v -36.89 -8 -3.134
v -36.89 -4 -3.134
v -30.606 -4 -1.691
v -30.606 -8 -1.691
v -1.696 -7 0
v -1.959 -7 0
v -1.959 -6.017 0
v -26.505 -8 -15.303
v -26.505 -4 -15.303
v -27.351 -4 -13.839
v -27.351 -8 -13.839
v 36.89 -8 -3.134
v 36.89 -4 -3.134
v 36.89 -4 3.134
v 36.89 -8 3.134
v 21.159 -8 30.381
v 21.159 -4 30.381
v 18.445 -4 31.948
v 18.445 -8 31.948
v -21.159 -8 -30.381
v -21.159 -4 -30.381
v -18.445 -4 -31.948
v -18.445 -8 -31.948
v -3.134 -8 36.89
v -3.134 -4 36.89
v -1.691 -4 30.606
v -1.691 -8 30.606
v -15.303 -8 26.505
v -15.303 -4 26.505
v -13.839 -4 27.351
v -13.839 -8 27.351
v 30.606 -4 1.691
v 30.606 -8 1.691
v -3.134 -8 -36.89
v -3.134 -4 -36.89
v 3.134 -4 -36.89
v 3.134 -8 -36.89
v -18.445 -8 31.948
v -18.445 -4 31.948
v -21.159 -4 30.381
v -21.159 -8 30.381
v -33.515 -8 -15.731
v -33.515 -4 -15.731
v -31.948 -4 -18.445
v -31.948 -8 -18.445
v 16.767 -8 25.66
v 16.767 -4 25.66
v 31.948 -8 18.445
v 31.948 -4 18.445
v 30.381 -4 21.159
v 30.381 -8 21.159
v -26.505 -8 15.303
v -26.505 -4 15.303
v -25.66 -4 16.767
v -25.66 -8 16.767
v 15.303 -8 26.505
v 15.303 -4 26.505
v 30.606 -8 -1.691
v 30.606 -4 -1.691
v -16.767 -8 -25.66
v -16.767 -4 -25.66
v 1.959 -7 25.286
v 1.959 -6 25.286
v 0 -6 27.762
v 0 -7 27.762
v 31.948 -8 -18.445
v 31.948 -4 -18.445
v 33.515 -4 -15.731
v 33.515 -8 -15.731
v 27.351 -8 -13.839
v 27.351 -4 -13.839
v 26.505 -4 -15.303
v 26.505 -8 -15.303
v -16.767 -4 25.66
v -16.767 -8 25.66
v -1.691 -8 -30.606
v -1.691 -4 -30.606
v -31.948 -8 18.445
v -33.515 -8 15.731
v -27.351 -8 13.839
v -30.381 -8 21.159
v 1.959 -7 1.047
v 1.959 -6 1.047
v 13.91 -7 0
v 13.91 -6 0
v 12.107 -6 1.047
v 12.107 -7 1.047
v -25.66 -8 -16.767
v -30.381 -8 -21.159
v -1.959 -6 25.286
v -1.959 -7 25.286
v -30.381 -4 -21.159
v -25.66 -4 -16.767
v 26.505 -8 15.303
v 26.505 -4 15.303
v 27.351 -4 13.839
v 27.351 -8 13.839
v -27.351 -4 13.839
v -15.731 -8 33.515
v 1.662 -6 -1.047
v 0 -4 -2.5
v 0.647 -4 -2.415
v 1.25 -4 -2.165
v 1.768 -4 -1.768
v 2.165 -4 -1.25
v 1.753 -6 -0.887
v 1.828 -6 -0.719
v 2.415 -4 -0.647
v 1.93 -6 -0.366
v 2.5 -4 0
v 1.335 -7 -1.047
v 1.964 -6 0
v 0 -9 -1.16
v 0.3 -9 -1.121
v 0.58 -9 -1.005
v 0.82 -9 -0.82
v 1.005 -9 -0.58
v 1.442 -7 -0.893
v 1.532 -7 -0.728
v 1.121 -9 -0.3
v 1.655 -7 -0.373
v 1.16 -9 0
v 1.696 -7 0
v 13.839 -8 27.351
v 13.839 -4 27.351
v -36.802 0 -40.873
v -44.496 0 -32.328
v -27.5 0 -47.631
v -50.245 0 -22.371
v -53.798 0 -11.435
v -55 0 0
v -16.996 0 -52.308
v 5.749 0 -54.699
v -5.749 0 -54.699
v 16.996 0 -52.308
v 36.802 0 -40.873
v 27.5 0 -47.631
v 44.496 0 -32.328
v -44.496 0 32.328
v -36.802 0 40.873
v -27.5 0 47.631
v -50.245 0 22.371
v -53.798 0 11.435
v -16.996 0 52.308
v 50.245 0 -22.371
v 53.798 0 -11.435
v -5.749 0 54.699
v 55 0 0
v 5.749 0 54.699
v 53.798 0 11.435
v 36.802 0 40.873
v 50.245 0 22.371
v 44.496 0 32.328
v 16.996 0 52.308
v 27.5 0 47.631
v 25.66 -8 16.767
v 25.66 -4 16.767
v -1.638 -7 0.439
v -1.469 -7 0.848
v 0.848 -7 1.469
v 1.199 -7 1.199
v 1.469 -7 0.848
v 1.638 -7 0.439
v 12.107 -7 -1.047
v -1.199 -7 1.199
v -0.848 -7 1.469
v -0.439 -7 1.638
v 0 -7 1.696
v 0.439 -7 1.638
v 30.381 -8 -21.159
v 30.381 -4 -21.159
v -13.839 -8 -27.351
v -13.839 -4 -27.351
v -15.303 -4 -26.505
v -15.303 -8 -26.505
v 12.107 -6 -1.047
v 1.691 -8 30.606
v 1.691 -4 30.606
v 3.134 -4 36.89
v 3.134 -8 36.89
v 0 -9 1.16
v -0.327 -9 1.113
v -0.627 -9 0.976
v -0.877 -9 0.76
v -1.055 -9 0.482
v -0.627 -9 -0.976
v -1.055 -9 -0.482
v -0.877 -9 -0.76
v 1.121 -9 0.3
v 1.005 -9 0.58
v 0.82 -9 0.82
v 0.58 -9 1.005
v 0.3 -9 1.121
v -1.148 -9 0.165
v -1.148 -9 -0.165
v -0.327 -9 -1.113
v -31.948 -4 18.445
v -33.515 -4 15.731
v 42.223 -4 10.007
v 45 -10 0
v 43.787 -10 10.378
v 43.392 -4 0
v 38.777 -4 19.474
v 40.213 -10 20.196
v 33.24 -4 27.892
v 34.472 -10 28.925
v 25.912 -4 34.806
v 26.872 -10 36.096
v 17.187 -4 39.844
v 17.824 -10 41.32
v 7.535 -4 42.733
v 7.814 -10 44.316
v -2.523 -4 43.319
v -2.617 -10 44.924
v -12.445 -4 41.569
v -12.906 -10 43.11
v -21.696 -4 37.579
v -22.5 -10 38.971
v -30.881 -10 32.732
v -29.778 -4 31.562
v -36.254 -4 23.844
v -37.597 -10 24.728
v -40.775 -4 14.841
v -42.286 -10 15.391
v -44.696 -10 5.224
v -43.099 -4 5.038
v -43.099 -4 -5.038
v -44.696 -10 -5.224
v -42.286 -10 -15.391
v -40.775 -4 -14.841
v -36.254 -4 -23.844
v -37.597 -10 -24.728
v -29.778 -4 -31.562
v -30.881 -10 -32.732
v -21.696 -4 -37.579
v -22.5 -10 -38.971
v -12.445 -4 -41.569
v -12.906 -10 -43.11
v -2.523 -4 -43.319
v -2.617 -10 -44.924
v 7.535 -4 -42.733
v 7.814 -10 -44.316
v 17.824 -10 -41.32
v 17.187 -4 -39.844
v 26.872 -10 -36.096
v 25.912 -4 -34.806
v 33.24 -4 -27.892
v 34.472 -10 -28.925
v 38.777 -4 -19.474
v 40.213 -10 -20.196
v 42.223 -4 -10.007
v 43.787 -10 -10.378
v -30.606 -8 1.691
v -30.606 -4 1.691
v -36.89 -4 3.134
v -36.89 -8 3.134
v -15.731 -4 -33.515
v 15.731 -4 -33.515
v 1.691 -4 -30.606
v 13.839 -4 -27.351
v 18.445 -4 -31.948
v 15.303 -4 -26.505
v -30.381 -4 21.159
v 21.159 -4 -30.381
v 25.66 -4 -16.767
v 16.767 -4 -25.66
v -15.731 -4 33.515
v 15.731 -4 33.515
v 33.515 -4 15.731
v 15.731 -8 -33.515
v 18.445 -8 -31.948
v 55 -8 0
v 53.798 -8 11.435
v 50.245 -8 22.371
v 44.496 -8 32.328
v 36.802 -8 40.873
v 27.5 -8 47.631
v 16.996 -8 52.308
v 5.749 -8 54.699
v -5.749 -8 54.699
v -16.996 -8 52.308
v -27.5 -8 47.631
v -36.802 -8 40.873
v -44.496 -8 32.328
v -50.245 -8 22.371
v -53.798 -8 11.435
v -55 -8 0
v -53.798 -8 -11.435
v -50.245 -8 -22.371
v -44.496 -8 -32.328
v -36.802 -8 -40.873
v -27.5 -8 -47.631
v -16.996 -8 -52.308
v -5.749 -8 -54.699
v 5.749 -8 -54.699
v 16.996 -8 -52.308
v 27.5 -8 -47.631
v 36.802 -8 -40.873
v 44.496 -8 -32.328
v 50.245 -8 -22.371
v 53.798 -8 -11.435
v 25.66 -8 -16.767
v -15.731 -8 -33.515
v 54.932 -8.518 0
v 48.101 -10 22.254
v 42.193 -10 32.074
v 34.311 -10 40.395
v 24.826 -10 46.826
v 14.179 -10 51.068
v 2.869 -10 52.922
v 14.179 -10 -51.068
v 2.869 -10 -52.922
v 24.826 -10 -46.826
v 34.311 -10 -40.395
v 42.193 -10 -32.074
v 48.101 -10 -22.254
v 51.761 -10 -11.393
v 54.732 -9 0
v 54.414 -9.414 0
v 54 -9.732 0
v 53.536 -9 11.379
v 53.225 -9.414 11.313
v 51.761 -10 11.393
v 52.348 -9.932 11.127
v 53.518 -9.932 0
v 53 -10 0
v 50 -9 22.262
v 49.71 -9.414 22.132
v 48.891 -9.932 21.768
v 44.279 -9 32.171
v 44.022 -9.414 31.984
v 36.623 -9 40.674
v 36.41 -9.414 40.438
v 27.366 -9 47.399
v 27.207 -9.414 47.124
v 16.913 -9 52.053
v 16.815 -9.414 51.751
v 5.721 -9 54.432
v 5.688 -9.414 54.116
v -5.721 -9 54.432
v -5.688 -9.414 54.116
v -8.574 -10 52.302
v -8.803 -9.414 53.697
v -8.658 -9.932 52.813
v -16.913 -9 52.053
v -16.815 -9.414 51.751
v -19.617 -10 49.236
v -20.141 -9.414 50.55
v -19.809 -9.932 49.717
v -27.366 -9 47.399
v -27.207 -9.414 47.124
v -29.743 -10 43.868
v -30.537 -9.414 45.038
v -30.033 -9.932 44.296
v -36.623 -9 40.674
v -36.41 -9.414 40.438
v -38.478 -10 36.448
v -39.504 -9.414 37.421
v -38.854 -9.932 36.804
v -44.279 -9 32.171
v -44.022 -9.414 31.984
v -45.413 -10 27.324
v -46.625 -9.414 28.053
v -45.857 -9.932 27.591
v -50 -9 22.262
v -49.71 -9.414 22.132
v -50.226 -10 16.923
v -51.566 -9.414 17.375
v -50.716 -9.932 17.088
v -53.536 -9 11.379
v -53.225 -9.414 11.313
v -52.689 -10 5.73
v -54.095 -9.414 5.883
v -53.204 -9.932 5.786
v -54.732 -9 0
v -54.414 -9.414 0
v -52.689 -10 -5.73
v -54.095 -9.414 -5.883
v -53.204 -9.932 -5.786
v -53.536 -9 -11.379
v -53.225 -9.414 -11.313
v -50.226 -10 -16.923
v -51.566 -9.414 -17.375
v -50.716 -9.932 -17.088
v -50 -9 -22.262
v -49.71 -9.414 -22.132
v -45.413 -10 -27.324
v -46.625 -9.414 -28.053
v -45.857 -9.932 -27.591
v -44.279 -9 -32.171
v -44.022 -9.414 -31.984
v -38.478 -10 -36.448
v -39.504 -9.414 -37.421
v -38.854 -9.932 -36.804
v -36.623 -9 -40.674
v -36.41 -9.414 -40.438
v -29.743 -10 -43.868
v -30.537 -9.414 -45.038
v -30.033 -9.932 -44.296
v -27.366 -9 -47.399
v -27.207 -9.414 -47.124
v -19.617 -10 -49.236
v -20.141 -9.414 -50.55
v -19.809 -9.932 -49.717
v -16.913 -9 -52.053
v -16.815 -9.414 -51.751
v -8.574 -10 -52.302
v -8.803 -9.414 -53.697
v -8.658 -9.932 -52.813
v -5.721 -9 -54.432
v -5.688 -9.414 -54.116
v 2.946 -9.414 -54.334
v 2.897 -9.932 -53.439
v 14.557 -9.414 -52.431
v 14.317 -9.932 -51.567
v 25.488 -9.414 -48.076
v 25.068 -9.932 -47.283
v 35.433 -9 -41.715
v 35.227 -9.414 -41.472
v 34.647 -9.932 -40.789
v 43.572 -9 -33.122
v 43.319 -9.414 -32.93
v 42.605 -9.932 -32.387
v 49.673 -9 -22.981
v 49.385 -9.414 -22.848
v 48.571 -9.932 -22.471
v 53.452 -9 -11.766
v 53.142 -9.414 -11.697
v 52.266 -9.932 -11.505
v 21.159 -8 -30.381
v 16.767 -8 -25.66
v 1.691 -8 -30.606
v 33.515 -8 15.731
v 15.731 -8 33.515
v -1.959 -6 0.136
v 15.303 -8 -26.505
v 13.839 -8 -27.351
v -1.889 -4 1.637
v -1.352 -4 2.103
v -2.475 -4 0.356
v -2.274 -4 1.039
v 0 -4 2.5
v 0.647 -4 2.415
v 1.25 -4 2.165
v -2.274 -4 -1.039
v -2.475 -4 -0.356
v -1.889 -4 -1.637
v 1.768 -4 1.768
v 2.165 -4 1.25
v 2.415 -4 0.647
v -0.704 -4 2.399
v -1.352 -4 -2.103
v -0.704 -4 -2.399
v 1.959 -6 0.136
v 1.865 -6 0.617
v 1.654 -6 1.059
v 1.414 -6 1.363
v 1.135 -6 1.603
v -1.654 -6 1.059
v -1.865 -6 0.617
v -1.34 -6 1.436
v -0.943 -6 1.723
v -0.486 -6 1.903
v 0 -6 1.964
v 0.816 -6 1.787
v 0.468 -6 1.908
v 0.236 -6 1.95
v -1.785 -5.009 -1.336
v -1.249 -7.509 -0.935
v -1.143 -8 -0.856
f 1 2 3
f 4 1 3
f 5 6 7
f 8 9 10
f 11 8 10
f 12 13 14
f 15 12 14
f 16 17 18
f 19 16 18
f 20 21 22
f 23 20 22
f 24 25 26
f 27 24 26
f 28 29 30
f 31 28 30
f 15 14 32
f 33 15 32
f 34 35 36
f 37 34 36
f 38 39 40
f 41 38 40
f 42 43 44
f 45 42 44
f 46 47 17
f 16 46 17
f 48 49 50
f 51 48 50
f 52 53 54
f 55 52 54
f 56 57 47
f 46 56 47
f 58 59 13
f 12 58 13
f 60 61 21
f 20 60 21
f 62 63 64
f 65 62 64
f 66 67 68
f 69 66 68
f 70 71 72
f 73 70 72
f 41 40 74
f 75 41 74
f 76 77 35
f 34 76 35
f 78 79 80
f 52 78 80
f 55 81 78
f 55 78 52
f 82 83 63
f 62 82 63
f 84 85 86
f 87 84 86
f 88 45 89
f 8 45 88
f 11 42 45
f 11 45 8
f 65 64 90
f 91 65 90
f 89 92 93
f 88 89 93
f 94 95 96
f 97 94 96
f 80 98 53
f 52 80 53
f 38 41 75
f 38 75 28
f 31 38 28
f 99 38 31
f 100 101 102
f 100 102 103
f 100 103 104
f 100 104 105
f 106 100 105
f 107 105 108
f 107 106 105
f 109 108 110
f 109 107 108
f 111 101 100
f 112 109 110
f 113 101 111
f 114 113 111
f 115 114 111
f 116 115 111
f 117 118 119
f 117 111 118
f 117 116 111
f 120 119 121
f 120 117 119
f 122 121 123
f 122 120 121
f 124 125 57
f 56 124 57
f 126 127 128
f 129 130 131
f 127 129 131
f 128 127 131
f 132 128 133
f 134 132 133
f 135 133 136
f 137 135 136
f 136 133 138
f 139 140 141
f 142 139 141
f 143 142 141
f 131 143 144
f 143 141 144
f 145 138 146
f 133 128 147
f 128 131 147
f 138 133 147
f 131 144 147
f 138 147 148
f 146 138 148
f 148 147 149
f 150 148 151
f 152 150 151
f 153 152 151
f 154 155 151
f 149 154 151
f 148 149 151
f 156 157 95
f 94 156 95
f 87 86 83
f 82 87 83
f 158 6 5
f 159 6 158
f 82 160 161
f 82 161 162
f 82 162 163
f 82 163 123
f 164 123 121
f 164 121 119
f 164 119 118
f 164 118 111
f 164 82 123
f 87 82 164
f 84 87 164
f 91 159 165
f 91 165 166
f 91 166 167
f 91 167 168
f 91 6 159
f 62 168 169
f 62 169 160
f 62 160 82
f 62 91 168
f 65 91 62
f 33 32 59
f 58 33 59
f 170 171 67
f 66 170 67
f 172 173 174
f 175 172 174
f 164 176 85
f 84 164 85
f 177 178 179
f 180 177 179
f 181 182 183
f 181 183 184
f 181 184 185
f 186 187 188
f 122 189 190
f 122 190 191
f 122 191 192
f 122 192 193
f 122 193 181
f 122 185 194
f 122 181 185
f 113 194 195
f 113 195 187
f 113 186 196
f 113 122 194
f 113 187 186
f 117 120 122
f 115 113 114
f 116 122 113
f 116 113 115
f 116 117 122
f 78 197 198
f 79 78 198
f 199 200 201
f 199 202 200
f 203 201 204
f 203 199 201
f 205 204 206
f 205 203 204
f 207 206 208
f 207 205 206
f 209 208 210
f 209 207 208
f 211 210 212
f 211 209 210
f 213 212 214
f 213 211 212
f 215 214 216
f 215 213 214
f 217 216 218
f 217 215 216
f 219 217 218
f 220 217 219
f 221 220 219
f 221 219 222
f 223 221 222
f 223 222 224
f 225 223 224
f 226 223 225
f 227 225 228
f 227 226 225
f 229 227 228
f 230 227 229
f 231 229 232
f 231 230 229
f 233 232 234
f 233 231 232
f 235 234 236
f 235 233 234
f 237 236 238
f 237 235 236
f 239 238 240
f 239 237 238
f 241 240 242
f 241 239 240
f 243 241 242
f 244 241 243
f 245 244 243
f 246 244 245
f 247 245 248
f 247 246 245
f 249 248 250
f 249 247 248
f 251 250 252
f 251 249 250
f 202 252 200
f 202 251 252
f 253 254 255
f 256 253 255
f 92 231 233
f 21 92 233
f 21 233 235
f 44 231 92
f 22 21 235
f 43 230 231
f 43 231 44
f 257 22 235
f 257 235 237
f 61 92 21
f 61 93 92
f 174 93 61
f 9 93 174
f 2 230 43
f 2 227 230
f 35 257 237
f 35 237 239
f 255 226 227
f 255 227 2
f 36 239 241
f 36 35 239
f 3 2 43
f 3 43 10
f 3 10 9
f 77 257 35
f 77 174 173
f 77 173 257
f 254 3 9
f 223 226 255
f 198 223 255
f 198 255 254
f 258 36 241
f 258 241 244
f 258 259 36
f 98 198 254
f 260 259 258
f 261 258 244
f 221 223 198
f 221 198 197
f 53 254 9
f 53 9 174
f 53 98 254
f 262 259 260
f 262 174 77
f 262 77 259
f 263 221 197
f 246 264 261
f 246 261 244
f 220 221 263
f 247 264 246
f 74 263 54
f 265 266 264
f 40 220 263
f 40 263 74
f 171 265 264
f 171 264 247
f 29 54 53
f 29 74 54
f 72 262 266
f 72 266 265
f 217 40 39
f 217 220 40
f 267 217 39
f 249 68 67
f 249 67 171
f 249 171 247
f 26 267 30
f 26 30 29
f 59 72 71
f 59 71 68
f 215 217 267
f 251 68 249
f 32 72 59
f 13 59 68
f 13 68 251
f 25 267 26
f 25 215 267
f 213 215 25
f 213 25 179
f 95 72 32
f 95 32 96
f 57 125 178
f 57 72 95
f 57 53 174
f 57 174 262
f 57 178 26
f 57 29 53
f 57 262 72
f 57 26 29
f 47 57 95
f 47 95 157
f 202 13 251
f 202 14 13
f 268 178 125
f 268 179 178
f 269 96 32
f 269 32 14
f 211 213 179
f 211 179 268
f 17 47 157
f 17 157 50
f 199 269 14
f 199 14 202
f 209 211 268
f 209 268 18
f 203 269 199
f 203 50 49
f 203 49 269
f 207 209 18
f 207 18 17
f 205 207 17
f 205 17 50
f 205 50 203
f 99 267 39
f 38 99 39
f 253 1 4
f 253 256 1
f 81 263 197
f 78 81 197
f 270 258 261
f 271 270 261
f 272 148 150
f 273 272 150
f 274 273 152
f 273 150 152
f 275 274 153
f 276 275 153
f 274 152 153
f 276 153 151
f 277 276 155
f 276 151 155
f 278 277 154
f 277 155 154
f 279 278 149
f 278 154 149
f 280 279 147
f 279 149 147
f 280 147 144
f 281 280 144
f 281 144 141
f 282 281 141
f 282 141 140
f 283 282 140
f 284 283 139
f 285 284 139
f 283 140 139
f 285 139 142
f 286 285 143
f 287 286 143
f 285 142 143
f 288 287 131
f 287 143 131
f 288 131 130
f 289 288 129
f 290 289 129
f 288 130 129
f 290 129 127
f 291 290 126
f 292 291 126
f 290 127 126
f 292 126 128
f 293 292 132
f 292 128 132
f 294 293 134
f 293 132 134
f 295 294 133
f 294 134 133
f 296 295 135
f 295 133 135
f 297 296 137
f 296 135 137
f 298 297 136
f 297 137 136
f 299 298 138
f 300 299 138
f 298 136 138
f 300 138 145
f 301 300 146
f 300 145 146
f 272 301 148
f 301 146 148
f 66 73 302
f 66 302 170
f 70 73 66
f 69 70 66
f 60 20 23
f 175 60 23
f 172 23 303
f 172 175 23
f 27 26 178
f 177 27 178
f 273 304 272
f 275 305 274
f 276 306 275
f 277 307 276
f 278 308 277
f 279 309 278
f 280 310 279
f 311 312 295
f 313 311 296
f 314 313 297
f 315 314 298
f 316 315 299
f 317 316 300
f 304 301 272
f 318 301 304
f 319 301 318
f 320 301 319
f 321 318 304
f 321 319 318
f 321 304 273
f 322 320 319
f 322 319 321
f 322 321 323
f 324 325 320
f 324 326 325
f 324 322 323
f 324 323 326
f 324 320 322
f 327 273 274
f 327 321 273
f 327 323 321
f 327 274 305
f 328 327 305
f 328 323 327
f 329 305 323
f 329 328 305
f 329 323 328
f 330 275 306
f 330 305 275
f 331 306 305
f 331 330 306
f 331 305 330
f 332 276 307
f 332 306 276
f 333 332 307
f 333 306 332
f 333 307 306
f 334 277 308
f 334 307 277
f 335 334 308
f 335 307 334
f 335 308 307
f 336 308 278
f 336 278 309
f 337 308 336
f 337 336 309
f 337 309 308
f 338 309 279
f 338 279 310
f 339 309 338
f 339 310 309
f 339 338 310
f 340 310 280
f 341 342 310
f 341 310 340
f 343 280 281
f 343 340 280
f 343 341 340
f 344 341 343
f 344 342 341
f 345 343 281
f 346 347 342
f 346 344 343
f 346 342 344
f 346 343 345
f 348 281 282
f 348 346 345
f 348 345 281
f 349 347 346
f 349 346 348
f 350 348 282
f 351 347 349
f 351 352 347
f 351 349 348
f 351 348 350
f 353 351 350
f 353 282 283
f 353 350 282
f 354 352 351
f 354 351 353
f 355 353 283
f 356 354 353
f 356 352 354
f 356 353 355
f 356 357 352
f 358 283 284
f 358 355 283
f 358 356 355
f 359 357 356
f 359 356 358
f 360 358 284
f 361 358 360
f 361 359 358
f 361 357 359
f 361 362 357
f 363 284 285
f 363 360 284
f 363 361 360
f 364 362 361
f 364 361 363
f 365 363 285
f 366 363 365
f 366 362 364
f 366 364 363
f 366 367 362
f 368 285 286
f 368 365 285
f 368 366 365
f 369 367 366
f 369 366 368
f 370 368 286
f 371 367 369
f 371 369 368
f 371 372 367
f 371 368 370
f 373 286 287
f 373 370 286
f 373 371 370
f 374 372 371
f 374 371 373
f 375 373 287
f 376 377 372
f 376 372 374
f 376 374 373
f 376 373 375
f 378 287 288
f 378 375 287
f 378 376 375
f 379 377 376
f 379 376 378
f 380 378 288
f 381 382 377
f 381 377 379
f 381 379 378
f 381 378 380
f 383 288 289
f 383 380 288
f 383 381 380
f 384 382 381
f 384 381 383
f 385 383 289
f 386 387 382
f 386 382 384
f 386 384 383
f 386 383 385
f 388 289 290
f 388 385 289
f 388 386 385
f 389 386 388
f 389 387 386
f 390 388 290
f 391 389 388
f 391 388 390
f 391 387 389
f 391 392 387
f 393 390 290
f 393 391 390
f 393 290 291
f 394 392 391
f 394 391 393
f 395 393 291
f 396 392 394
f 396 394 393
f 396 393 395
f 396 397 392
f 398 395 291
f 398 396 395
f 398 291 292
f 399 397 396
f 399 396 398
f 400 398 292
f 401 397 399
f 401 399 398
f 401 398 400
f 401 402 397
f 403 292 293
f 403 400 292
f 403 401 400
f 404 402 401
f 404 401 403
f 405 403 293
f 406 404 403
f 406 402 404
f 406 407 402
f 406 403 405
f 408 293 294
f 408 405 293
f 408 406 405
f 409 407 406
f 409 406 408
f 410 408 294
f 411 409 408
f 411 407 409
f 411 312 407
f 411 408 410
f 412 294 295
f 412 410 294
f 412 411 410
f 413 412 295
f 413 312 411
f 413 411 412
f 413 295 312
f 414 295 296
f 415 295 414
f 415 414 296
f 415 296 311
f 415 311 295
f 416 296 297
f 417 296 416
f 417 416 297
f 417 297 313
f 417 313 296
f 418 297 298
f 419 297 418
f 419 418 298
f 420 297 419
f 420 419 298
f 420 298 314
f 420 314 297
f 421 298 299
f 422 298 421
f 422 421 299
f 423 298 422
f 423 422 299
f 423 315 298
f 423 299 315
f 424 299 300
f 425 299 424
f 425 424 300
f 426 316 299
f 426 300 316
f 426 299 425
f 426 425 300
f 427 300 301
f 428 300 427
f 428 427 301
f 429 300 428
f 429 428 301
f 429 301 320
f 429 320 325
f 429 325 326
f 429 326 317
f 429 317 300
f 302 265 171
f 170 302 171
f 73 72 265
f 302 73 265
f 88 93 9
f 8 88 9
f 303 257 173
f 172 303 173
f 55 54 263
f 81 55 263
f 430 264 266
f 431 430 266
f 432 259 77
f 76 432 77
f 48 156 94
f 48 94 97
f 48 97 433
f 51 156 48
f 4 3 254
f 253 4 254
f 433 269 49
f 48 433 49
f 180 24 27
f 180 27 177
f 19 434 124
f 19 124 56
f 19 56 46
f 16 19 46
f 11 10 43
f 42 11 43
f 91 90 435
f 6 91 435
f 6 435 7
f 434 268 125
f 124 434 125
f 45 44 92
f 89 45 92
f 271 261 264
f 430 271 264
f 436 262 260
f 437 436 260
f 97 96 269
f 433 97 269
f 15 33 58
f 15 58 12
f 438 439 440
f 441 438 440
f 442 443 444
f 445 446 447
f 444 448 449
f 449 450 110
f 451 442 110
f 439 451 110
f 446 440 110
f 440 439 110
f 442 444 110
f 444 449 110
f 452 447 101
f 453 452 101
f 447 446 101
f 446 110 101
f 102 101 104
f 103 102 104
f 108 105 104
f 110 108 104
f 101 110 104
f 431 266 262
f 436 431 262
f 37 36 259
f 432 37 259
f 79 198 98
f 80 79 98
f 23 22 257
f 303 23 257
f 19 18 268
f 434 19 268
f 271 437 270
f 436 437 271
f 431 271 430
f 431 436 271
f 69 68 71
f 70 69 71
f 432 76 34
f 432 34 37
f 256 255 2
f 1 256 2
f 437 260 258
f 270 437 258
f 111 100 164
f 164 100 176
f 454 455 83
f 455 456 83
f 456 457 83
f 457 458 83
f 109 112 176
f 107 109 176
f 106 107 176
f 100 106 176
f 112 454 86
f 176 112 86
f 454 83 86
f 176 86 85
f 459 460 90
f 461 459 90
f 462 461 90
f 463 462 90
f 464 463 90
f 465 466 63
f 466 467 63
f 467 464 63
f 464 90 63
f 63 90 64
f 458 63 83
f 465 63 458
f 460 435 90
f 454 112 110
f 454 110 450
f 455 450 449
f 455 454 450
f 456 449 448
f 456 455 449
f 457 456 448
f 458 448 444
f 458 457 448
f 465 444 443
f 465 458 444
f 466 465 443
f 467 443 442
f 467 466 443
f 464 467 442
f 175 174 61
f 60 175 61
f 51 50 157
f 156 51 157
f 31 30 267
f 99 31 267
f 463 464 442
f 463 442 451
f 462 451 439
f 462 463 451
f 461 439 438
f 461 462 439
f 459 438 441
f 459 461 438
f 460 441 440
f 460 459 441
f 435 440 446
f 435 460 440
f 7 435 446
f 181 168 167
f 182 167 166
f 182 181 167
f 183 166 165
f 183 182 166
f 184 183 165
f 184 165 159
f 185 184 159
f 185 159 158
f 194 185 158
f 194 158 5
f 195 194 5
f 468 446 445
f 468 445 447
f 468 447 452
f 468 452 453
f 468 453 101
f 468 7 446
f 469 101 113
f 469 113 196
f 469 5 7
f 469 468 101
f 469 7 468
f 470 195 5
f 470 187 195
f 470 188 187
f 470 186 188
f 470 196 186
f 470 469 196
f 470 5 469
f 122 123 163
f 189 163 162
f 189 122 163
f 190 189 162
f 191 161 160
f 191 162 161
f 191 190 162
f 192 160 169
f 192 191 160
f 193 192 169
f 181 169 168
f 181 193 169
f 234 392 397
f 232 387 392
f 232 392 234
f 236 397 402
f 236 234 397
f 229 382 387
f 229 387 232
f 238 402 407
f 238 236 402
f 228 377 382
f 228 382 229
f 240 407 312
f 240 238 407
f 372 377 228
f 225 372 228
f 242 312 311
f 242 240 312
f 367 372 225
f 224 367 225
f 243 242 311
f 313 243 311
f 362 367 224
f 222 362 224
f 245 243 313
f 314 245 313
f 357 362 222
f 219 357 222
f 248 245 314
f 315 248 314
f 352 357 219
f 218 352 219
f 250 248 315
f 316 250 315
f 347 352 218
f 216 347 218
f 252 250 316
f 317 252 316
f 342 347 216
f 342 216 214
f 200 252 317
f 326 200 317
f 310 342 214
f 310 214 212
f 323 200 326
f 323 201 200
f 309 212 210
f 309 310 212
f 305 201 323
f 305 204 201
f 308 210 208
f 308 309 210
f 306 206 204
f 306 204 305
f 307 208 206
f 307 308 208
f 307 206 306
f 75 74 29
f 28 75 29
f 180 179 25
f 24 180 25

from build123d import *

# Parameters (mm, degrees)
F0_R      = 55
F1_DEPTH  = 10
F2_R      = 45
F3_DEPTH  = 6
F3_TAPER  = 15
F5_DEPTH  = 4
F11_DEPTH = 5
F11_TAPER = 15
F14_DEPTH = 1
F16_DEPTH = 1
F17_R     = 2


# Not quite as in the source:
# - the program builds the solid bodies; features that only make, move or delete a surface that nothing else refers to are left out


with BuildPart() as f1:
    # F0 (on Front) → F1 (new body)
    with BuildSketch(Plane.XZ):
        Circle(F0_R)
    extrude(amount=F1_DEPTH)

    # F2 (on face) → F3 (cut)
    with BuildSketch(Plane.XZ.offset(10)):
        Circle(F2_R)
    extrude(amount=-F3_DEPTH, taper=F3_TAPER, mode=Mode.SUBTRACT)

    # F4 (on face) → F5 (join)
    with BuildSketch(Plane.XZ.offset(4)):
        Polygon((0, 36.8904769421), (-3.1339118723, 36.8904769421), (-1.6905769007, 30.6056980044), (0, 30.6056980044), (1.6905769007, 30.6056980044), (3.1339118723, 36.8904769421), align=None)
        Polygon((18.445238471, 31.9480901896), (15.7311911764, 33.5150461257), (13.8387664591, 27.3506004227), (15.3028490022, 26.5053119723), (16.7669315453, 25.660023522), (21.1592857656, 30.3811342534), align=None)
        Polygon((31.9480901896, 18.445238471), (30.3811342534, 21.1592857656), (25.660023522, 16.7669315453), (26.5053119723, 15.3028490022), (27.3506004227, 13.8387664591), (33.5150461257, 15.7311911764), align=None)
        Polygon((36.8904769421, 0), (36.8904769421, 3.1339118723), (30.6056980044, 1.6905769007), (30.6056980044, 0), (30.6056980044, -1.6905769007), (36.8904769421, -3.1339118723), align=None)
        Polygon((31.9480901896, -18.445238471), (33.5150461257, -15.7311911764), (27.3506004227, -13.8387664591), (26.5053119723, -15.3028490022), (25.660023522, -16.7669315453), (30.3811342534, -21.1592857656), align=None)
        Polygon((18.445238471, -31.9480901896), (21.1592857656, -30.3811342534), (16.7669315453, -25.660023522), (15.3028490022, -26.5053119723), (13.8387664591, -27.3506004227), (15.7311911764, -33.5150461257), align=None)
        Polygon((0, -36.8904769421), (3.1339118723, -36.8904769421), (1.6905769007, -30.6056980044), (0, -30.6056980044), (-1.6905769007, -30.6056980044), (-3.1339118723, -36.8904769421), align=None)
        Polygon((-18.445238471, -31.9480901896), (-15.7311911764, -33.5150461257), (-13.8387664591, -27.3506004227), (-15.3028490022, -26.5053119723), (-16.7669315453, -25.660023522), (-21.1592857656, -30.3811342534), align=None)
        Polygon((-31.9480901896, -18.445238471), (-30.3811342534, -21.1592857656), (-25.660023522, -16.7669315453), (-26.5053119723, -15.3028490022), (-27.3506004227, -13.8387664591), (-33.5150461257, -15.7311911764), align=None)
        Polygon((-36.8904769421, 0), (-36.8904769421, -3.1339118723), (-30.6056980044, -1.6905769007), (-30.6056980044, 0), (-30.6056980044, 1.6905769007), (-36.8904769421, 3.1339118723), align=None)
        Polygon((-31.9480901896, 18.445238471), (-33.5150461257, 15.7311911764), (-27.3506004227, 13.8387664591), (-26.5053119723, 15.3028490022), (-25.660023522, 16.7669315453), (-30.3811342534, 21.1592857656), align=None)
        Polygon((-18.445238471, 31.9480901896), (-21.1592857656, 30.3811342534), (-16.7669315453, 25.660023522), (-15.3028490022, 26.5053119723), (-13.8387664591, 27.3506004227), (-15.7311911764, 33.5150461257), align=None)
    extrude(amount=F5_DEPTH)

    # F17
    f17_edges = [f1.edges().sort_by_distance(p)[0] for p in [
        (-55, -10, 0),
    ]]
    fillet(f17_edges, radius=F17_R)


with BuildPart() as f11:
    # F10 (on offset) → F11 (new body)
    with BuildSketch(Plane.XZ.offset(4)):
        with BuildLine():
            ThreePointArc((0, -2.5), (1.767766953, -1.767766953), (2.5, 0))
            ThreePointArc((2.5, 0), (1.767766953, 1.767766953), (0, 2.5))
            Line((0, 2.5), (0, -2.5))
        make_face()
        with BuildLine():
            Line((0, -2.5), (0, 2.5))
            ThreePointArc((0, 2.5), (-2.5, 0), (0, -2.5))
        make_face()
    extrude(amount=F11_DEPTH, taper=F11_TAPER)

    # F13 (on offset) → F14 (join)
    with BuildSketch(Plane.XZ.offset(6)):
        Polygon((0, 27.7616046369), (-1.9594193436, 25.2858418971), (0, 25.2858418971), (1.9594193436, 25.2858418971), align=None)
        Polygon((0, 25.2858418971), (-1.9594193436, 25.2858418971), (-1.9594193436, 0), (1.9594193436, 0), (1.9594193436, 25.2858418971), align=None)
    extrude(amount=F14_DEPTH)

    # F15 (on offset) → F16 (join)
    with BuildSketch(Plane.XZ.offset(6)):
        Polygon((12.1070826426, 0), (12.1070826426, 1.0465652449), (0, 1.0465652449), (0, -1.0465652449), (12.1070826426, -1.0465652449), align=None)
        Polygon((13.9101780951, 0), (12.1070826426, 1.0465652449), (12.1070826426, 0), (12.1070826426, -1.0465652449), align=None)
    extrude(amount=F16_DEPTH)


solid = Compound([f1.part, f11.part])
